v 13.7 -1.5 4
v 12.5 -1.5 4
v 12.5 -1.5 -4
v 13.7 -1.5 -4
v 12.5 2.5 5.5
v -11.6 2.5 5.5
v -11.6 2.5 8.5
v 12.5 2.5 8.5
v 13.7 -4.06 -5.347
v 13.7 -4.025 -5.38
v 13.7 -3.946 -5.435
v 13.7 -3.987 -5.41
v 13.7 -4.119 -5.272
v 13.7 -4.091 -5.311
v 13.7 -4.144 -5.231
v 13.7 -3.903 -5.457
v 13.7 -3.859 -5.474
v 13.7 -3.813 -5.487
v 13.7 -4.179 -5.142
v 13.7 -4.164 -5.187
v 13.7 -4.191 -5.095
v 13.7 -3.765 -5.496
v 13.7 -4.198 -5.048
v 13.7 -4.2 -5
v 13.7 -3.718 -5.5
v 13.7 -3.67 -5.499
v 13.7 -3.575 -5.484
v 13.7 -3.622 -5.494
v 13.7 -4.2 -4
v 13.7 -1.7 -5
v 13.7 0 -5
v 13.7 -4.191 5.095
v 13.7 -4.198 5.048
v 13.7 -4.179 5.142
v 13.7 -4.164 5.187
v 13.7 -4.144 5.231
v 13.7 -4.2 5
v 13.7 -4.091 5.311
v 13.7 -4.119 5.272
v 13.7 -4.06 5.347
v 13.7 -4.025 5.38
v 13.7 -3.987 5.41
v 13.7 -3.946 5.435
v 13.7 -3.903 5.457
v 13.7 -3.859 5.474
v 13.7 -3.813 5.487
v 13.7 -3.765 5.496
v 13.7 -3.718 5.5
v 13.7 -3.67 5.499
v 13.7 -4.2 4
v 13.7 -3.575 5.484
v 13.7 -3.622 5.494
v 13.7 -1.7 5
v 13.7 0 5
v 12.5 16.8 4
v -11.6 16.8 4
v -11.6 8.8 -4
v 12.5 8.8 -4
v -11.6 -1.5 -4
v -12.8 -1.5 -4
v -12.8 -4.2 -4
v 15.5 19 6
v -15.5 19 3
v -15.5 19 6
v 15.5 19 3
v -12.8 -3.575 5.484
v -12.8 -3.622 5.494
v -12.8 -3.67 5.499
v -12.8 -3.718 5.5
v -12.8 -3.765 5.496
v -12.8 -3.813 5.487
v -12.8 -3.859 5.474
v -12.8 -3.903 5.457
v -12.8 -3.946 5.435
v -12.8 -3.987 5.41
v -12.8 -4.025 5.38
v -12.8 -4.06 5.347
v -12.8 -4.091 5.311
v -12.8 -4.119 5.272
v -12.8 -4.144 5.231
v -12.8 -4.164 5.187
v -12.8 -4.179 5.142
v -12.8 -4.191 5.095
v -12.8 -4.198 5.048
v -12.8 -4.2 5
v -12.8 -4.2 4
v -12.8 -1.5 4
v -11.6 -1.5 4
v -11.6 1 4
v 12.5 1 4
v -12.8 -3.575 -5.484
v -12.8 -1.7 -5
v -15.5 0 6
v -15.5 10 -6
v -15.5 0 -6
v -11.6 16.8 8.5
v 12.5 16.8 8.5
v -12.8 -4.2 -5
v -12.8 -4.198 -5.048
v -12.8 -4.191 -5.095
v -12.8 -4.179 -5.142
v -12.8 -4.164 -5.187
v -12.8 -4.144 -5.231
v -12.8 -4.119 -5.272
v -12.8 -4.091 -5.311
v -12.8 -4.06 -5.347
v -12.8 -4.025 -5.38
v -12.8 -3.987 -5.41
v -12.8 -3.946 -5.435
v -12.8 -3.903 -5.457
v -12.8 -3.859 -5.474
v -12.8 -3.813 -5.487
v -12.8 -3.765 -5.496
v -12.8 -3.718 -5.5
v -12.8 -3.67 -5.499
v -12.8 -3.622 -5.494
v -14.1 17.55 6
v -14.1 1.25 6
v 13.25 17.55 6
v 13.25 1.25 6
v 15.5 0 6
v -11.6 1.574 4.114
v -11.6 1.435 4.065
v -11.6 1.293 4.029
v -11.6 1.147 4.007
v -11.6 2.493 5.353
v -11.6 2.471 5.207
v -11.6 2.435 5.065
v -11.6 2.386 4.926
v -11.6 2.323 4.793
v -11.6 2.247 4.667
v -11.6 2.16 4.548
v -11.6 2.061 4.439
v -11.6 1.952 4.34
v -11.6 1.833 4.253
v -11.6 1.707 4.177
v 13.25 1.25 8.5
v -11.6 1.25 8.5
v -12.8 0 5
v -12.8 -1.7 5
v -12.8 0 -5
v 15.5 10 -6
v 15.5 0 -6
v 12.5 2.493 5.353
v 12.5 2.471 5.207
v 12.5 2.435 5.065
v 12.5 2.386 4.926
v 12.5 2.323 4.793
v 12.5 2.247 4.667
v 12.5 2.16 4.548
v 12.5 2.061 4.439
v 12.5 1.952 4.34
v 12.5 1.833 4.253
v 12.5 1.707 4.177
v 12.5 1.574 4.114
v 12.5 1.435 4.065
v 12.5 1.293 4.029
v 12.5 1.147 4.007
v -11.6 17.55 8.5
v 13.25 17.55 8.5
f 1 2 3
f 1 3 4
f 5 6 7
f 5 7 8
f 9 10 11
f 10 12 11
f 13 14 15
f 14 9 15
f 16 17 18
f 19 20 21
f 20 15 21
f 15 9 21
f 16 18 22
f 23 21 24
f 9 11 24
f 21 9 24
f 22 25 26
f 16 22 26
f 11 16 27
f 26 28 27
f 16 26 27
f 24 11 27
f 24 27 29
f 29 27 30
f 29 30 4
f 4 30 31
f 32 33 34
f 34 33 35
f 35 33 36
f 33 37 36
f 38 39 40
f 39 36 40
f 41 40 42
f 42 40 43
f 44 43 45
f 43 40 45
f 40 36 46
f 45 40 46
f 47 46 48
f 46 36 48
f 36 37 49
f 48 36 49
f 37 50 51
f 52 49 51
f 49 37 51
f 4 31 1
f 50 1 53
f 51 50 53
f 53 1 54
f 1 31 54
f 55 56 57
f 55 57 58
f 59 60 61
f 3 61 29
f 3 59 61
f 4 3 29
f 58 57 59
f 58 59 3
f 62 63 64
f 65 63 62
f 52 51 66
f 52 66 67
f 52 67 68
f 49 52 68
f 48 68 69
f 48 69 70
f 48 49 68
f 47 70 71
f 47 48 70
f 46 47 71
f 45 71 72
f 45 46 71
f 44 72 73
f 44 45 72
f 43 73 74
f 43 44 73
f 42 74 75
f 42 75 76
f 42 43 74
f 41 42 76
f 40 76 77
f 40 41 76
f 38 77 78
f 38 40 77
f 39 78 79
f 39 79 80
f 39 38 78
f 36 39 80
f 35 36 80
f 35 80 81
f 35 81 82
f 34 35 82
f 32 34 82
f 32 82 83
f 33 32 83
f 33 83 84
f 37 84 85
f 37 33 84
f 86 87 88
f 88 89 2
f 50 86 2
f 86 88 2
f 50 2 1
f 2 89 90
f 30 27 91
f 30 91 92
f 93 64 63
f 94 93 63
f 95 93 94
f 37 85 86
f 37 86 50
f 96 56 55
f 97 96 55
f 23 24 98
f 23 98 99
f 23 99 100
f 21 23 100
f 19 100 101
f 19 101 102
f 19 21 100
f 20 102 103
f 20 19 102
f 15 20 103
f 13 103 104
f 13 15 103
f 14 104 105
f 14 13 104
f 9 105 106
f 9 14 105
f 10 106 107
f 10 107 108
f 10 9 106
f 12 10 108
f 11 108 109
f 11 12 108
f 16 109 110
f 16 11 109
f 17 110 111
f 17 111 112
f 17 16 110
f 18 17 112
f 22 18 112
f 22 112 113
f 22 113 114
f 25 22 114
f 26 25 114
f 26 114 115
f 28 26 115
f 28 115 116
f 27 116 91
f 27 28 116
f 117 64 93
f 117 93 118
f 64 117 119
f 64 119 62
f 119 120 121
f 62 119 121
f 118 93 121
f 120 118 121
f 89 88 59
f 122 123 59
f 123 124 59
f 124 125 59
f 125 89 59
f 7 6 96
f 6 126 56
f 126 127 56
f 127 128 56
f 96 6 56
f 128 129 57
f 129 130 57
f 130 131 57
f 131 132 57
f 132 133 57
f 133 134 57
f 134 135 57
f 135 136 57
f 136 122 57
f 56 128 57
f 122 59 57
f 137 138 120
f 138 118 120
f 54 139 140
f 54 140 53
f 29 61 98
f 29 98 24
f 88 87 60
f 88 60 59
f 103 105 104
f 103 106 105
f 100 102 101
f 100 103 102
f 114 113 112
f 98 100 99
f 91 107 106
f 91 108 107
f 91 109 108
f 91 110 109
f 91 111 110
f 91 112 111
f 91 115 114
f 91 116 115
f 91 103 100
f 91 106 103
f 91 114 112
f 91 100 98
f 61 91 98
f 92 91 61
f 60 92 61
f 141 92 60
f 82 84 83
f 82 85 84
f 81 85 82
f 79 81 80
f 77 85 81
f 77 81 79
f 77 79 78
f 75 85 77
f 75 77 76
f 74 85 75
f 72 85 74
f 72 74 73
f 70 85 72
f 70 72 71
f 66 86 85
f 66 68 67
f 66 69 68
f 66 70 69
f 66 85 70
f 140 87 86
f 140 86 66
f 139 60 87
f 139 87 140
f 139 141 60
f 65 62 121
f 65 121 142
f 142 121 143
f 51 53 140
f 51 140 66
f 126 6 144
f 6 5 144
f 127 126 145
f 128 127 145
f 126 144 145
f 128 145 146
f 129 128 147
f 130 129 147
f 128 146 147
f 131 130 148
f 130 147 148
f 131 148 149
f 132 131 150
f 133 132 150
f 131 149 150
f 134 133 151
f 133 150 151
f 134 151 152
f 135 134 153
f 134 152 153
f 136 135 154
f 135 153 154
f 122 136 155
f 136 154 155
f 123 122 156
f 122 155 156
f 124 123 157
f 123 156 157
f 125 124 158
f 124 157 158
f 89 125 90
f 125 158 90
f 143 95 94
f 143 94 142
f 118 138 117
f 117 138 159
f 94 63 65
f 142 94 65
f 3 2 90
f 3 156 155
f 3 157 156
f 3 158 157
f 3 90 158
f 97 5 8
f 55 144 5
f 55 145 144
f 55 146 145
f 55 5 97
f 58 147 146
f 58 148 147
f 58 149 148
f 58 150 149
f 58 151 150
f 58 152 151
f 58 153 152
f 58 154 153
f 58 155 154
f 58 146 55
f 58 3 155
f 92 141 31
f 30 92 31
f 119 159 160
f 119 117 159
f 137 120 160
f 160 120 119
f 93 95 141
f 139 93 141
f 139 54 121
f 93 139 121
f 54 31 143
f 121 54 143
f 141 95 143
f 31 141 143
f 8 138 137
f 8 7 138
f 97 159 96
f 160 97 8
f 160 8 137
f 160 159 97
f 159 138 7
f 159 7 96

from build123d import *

# Parameters (mm, degrees)
SKETCH1_W           = 31
SKETCH1_H           = 12
BOSS_EXTRUDE1_DEPTH = 19
SKETCH2_W           = 24.1
SKETCH2_H           = 8
CUT_EXTRUDE1_DEPTH  = 16.8
SKETCH3_W           = 24.1
SKETCH3_H           = 14.3
CUT_EXTRUDE2_DEPTH  = 2
FILLET1_SIZE        = 8
FILLET2_SIZE        = 9
SKETCH6_W           = 26.5
SKETCH6_H           = 1
BOSS_EXTRUDE3_DEPTH = 4.2
BOSS_EXTRUDE6_DEPTH = 26.5
SKETCH15_W          = 1.2
SKETCH15_H          = 8
BOSS_EXTRUDE7_DEPTH = 1.5
SKETCH4_W           = 27.35
SKETCH4_H           = 16.3
SKETCH4_W_2         = 24.1
SKETCH4_H_2         = 14.3
BOSS_EXTRUDE2_DEPTH = 2.5
CHAMFER1_SIZE       = 2.5
FILLET3_R           = 1.5


with BuildPart() as part:
    # Sketch1 → Boss-Extrude1 (new body)
    with BuildSketch(Plane(origin=(0, 0, 0), x_dir=(1, 0, 0), z_dir=(0, 1, 0))):
        Rectangle(SKETCH1_W, SKETCH1_H)
    extrude(amount=BOSS_EXTRUDE1_DEPTH)

    # Sketch2 → Cut-Extrude1 (cut)
    with BuildSketch(Plane.XZ):
        with Locations((0.45, 0)):
            Rectangle(SKETCH2_W, SKETCH2_H)
    extrude(amount=-CUT_EXTRUDE1_DEPTH, mode=Mode.SUBTRACT)

    # Sketch3 → Cut-Extrude2 (cut)
    with BuildSketch(Plane.XY.offset(6)):
        with Locations((0.45, 9.65)):
            Rectangle(SKETCH3_W, SKETCH3_H)
    extrude(amount=-CUT_EXTRUDE2_DEPTH, mode=Mode.SUBTRACT)

    # Fillet1
    fillet1_edges = [part.edges().sort_by_distance(p)[0] for p in [
        (0.45, 16.8, -4),
    ]]
    chamfer(fillet1_edges, length=FILLET1_SIZE)

    # Fillet2
    fillet2_edges = [part.edges().sort_by_distance(p)[0] for p in [
        (0, 19, -6),
    ]]
    chamfer(fillet2_edges, length=FILLET2_SIZE)

    # Sketch6 → Boss-Extrude3 (add)
    with BuildSketch(Plane.XZ):
        with Locations((0.45, 4.5)):
            Rectangle(SKETCH6_W, SKETCH6_H)
        with Locations((0.45, -4.5)):
            Rectangle(SKETCH6_W, SKETCH6_H)
    extrude(amount=BOSS_EXTRUDE3_DEPTH)

    # Sketch14 → Boss-Extrude6 (add)
    with BuildSketch(Plane(origin=(13.7, 0, 0), x_dir=(0, 0, -1), z_dir=(1, 0, 0))):
        with BuildLine():
            Line((5.484122918, -3.575), (5, -1.7))
            Line((5, -1.7), (5, -4.2))
            ThreePointArc((5, -4.2), (5.395284708, -4.006186218), (5.484122918, -3.575))
        make_face()
        with BuildLine():
            Line((-5, -4.2), (-5, -1.7))
            Line((-5, -1.7), (-5.484122918, -3.575))
            ThreePointArc((-5.484122918, -3.575), (-5.395284708, -4.006186218), (-5, -4.2))
        make_face()
    extrude(amount=-BOSS_EXTRUDE6_DEPTH)

    # Sketch15 → Boss-Extrude7 (add)
    with BuildSketch(Plane.XZ):
        with Locations((-12.2, 0)):
            Rectangle(SKETCH15_W, SKETCH15_H)
        with Locations((13.1, 0)):
            Rectangle(SKETCH15_W, SKETCH15_H)
    extrude(amount=BOSS_EXTRUDE7_DEPTH)

    # Sketch4 → Boss-Extrude2 (add)
    with BuildSketch(Plane.XY.offset(6)):
        with Locations((-0.425, 9.4)):
            Rectangle(SKETCH4_W, SKETCH4_H)
        with Locations((0.45, 9.65)):
            Rectangle(SKETCH4_W_2, SKETCH4_H_2, mode=Mode.SUBTRACT)
    extrude(amount=BOSS_EXTRUDE2_DEPTH)

    # Chamfer1
    chamfer1_edges = [part.edges().sort_by_distance(p)[0] for p in [
        (-14.1, 9.4, 8.5),
    ]]
    chamfer(chamfer1_edges, length=CHAMFER1_SIZE - 0.0001)  # a hair under: the kernel refuses the full size

    # Fillet3
    fillet3_edges = [part.edges().sort_by_distance(p)[0] for p in [
        (0.45, 2.5, 4),
    ]]
    fillet(fillet3_edges, radius=FILLET3_R)


solid = part.part
